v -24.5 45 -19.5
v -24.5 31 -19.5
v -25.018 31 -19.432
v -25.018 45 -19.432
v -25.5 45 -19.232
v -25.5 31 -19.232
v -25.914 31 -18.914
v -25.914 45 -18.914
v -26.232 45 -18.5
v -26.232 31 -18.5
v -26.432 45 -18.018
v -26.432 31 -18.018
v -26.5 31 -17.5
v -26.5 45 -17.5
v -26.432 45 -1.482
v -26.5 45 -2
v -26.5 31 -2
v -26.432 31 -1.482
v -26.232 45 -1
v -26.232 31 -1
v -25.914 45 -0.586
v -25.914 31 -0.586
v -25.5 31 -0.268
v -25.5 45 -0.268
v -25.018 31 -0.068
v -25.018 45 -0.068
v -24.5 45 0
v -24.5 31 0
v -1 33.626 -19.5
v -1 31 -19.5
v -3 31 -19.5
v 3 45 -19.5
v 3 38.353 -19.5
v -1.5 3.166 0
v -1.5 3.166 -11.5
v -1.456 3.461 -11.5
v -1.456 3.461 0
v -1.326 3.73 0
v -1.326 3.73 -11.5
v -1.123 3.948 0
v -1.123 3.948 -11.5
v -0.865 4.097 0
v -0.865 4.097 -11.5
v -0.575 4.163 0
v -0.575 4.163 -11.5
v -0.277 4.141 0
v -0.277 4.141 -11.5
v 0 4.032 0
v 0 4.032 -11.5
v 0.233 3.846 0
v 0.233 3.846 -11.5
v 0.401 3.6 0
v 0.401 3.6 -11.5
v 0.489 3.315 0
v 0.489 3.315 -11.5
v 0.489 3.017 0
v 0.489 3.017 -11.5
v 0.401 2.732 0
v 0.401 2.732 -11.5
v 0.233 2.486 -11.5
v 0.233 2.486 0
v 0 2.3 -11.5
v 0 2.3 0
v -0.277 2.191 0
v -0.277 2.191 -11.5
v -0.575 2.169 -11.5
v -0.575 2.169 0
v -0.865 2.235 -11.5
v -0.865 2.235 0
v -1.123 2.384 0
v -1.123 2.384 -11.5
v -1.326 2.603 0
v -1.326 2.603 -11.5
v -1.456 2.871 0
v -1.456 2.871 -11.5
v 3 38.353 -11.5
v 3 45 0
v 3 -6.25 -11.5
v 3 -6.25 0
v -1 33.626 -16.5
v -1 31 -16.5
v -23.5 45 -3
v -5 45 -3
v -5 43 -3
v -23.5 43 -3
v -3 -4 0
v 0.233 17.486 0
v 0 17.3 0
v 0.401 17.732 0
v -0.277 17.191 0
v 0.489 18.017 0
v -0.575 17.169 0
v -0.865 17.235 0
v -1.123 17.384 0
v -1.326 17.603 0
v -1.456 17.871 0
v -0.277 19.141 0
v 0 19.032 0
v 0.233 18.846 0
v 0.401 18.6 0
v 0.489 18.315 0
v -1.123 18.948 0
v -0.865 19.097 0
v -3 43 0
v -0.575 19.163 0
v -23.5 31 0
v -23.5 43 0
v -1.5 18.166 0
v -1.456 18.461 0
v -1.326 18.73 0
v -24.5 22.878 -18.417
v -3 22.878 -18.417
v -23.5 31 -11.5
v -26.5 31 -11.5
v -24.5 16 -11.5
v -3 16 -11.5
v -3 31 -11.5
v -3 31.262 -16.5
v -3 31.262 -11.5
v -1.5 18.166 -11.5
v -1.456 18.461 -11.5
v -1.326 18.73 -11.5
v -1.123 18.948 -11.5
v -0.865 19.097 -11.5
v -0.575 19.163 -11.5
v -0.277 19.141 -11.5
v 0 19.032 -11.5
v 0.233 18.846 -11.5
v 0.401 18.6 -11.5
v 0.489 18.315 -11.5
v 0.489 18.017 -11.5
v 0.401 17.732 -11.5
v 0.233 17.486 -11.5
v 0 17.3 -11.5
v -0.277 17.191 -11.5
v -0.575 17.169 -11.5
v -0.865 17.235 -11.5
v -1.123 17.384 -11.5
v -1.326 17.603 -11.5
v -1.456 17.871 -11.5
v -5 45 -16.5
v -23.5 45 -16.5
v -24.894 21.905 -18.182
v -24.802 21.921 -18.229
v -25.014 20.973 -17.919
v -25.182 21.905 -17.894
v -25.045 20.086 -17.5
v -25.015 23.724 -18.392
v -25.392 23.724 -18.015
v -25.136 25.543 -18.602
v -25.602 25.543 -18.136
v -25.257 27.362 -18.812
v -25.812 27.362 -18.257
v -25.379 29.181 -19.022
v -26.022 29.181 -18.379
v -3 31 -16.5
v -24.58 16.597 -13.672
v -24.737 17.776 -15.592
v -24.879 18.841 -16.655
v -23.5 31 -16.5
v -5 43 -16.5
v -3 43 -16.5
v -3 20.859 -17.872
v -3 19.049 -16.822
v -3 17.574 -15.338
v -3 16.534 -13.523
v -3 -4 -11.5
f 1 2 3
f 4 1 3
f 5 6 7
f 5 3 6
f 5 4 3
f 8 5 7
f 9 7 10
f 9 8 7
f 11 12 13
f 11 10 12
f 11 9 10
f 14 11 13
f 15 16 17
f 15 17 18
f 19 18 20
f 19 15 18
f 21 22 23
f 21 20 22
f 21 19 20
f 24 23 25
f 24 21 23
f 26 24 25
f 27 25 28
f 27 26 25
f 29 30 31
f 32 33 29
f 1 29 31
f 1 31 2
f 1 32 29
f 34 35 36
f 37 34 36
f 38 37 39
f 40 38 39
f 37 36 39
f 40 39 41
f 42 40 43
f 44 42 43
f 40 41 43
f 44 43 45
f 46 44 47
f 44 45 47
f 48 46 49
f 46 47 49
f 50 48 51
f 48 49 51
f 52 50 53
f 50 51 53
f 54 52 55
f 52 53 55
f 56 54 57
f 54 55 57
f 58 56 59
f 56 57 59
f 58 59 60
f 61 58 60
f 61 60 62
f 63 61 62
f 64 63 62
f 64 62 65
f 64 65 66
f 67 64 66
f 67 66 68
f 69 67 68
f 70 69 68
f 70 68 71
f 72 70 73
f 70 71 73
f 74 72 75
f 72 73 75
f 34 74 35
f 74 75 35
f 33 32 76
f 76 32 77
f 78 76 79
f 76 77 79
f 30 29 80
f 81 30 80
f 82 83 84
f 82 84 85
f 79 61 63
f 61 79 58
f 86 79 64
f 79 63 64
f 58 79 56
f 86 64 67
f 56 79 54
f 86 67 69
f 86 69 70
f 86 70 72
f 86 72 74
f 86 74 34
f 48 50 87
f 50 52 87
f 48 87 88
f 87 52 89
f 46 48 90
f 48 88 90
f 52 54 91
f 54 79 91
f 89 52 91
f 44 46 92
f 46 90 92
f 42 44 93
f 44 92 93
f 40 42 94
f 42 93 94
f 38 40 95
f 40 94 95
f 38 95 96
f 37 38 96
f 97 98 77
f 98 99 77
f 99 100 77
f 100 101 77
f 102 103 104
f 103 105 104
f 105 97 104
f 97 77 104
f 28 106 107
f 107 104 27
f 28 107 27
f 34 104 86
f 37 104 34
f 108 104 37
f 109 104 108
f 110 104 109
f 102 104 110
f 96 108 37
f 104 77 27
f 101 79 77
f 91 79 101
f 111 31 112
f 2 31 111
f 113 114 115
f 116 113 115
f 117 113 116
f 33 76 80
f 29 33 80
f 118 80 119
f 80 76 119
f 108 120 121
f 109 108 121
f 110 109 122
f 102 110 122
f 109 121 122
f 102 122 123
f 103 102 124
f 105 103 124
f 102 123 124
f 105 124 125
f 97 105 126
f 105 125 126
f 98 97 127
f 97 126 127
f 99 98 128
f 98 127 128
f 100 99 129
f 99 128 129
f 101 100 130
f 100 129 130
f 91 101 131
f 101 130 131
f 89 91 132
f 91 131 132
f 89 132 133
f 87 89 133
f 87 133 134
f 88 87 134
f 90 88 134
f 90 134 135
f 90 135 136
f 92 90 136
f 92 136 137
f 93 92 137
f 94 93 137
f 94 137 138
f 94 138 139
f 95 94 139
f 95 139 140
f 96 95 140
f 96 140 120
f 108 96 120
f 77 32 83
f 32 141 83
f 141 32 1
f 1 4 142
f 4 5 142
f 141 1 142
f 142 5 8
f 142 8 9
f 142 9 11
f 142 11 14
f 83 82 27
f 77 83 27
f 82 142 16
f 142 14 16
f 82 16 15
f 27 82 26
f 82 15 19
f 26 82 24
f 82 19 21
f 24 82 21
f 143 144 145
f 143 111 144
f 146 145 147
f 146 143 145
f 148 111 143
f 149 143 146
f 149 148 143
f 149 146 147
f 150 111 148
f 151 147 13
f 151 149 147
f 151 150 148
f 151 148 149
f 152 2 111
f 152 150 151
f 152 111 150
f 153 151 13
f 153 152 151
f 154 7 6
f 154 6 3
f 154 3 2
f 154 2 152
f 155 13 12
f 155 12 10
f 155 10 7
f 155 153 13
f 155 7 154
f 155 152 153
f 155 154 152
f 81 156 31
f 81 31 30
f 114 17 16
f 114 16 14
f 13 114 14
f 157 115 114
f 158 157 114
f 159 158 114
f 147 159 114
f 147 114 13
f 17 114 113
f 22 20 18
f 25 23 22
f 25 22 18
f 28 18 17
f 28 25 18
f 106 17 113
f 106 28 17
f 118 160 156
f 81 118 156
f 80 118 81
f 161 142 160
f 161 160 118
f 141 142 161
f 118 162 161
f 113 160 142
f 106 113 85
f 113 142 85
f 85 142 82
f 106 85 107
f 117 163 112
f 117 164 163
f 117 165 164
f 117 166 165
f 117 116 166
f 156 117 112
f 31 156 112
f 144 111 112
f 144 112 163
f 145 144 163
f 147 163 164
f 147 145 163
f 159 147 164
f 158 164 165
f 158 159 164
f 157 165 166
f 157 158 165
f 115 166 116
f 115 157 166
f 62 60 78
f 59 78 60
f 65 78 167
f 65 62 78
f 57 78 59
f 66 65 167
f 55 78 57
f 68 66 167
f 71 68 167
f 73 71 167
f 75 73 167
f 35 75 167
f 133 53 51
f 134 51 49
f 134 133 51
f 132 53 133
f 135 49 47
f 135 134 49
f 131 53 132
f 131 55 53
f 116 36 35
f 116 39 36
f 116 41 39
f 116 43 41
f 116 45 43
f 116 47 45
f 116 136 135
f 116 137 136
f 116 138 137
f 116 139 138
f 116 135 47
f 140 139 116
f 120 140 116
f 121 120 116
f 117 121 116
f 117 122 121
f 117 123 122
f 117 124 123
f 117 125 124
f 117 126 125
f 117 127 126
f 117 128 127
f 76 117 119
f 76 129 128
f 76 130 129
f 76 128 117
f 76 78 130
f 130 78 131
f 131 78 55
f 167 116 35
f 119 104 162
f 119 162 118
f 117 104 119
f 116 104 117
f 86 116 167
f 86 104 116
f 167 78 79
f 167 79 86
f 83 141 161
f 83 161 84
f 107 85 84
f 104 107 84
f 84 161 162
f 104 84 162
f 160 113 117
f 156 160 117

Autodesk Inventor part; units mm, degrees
ref_plane "YZ Plane" through (0, 0, 0) normal (1, 0, 0) x (0, 1, 0)
sketch "スケッチ1" plane through (0, 0, 0) normal (1, 0, 0) x (0, 1, 0)
  line L0 (45, 0) -> (0, 0)
  line L1 (0, 0) -> (0, -11.5)
  line L2 (0, -11.5) -> (45, -11.5)
  line L3 (45, -11.5) -> (45, 0)
  dimension "d0" = 45
  dimension "d1" = 11.5
extrude "押し出し1" add sketch "スケッチ1" along normal blind 3
sketch "スケッチ5" plane through (0, 45, 0) normal (0, 1, 0) x (1, 0, 0)
  line L0 (-5, 3) -> (-23.5, 3)
  line L1 (-23.5, 3) -> (-23.5, 16.5)
  line L2 (-23.5, 16.5) -> (-5, 16.5)
  line L3 (-5, 16.5) -> (-5, 3)
  line L4 (0, 0) -> (-26.5, 0)
  line L5 (-26.5, 0) -> (-26.5, 19.5)
  line L6 (-26.5, 19.5) -> (0, 19.5)
  line L7 (0, 19.5) -> (0, 0)
  point P0 (3, 0)
  dimension "d15" = 18.5
  dimension "d16" = 13.5
  dimension "d17" = 3
  dimension "d18" = 5
  dimension "d19" = 3
  dimension "d20" = 3
extrude "押し出し4" add sketch "スケッチ5" against normal blind 2
ref_plane "作業平面1" through (0, 45, -9.5) normal (1, 0, 0) x (0, 0, -1)
sketch "スケッチ7" plane through (0, 45, -9.5) normal (1, 0, 0) x (0, 0, -1)
  line L0 (0, 0) -> (10, 0) projected
  line L1 (10, -2) -> (2, -2) projected
  line L2 (10, 0) -> (10, -2) projected
  line L3 (2, 0) -> (10, 0) projected
  line L4 (2, -2) -> (2, 0) projected
  point P0 (-9.5, -45)
extrude "押し出し6" cut sketch "スケッチ7" against normal blind 1
fillet "フィレット2" radius 2 2 edges at (-26.5, 44, 0) (-26.5, 44, -19.5)
sketch "スケッチ8" plane through (0, 0, 0) normal (-1, 0, 0) x (0, 0, 1)
  line L0 (0, 43) -> (-11.5, 43) projected
  line L1 (-11.5, 0) -> (-11.5, 43) projected
  line L2 (0, 0) -> (-11.5, 0) projected
  line L3 (0, 43) -> (0, 0) projected
  line L4 (-3, 39.3409) -> (0, 39.3409)
  line L5 (0, 39.3409) -> (0, 27.7002)
  line L6 (0, 27.7002) -> (-3, 27.7002)
  line L7 (-3, 27.7002) -> (-3, 39.3409)
extrude "押し出し7" add sketch "スケッチ8" along normal blind 3
ref_plane "作業平面2" through (3, 2, -11.5) normal (0, 0, -1) x (-1, 0, 0)
sketch "スケッチ10" plane through (3, 2, -11.5) normal (0, 0, -1) x (-1, 0, 0)
  line L0 (-2, -9) -> (6, -6) projected
  line L1 (6, -6) -> (6, 22) projected
  line L2 (0, -2) -> (0, 0) projected
  line L3 (0, -2) -> (6, -2) projected
  line L4 (0, -2) -> (0, -8.25)
  point P0 (3, -2)
extrude "押し出し9" add sketch "スケッチ10" against normal up to surface (11.5 mm away)
sketch "スケッチ11" plane through (3, 45, -11.5) normal (0, 0, -1) x (-1, 0, 0)
  circle A0 centre (3.5, -26.8338) radius 1 projected
  circle A1 centre (3.5, -41.8338) radius 1 projected
  point P0 (3, -45)
sketch "スケッチ12" plane through (0, 43, 0) normal (0, -1, 0) x (1, 0, 0)
  line L0 (-1, -11.5) -> (-3, -11.5) projected
  line L1 (-3, -11.5) -> (-3, 0) projected
  line L2 (-3, 0) -> (-24.5, 0) projected
  arc A0 (-24.5, 0) -> (-26.5, -2) centre (-24.5, -2) ccw projected
  line L3 (-26.5, -2) -> (-26.5, -17.5) projected
  arc A1 (-26.5, -17.5) -> (-24.5, -19.5) centre (-24.5, -17.5) ccw projected
  line L4 (-24.5, -19.5) -> (-1, -19.5) projected
  line L5 (-1, -19.5) -> (-1, -11.5) projected
  line L6 (-23.5, -3) -> (-5, -3) projected
  line L7 (-5, -3) -> (-5, -16.5) projected
  line L8 (-5, -16.5) -> (-23.5, -16.5) projected
  line L9 (-23.5, -16.5) -> (-23.5, -3) projected
  line L10 (-5, -16.5) -> (-1, -16.5)
  line L11 (-23.5, -3) -> (-23.5, 0)
  line L12 (-3, -11.5) -> (-5, -16.5)
  point P0 (0, 0)
extrude "押し出し10" add sketch "スケッチ12" along normal blind 12 contours L5 L4 A1 L3 A0 L2 L11 L9 L8 L10
sketch "スケッチ13" plane through (3, 45, -11.5) normal (0, 0, -1) x (-1, 0, 0)
  line L0 (6, -16.8338) -> (-2.2366, -7.0996) projected
  line L1 (6, -2) -> (6, -49) projected
  line L2 (4, -2) -> (6, -2) projected
  line L3 (4, -2) -> (4, 0) projected
  line L4 (4, 0) -> (0, 0) projected
  line L5 (0, 0) -> (0, -51.25) projected
  line L6 (0, -51.25) -> (6, -49) projected
  line L7 (0, -6.6466) -> (6, -13.7375)
  line L8 (6, -49) -> (6, -2) projected
  point P0 (3, -45)
  point P1 (6, -13.7375)
  dimension "d38" = 2
extrude "押し出し11" add sketch "スケッチ13" along normal up to surface (8 mm away) contours L7 L5 L4 L3 L2 L1
sketch "スケッチ14" plane through (0, 31, 0) normal (0, -1, 0) x (1, 0, 0)
  line L0 (-1, -19.5) -> (-1, -16.5) projected
  line L1 (-1, -16.5) -> (-23.5, -16.5) projected
  line L2 (-23.5, -16.5) -> (-23.5, 0) projected
  line L3 (-23.5, 0) -> (-24.5, 0) projected
  arc A0 (-24.5, 0) -> (-26.5, -2) centre (-24.5, -2) ccw projected
  line L4 (-26.5, -2) -> (-26.5, -17.5) projected
  arc A1 (-26.5, -17.5) -> (-24.5, -19.5) centre (-24.5, -17.5) ccw projected
  line L5 (-24.5, -19.5) -> (-1, -19.5) projected
  line L6 (-1, -19.5) -> (-26.5, -19.5)
  line L7 (-26.5, -19.5) -> (-26.5, -11.5)
  line L8 (-26.5, -11.5) -> (-1, -11.5)
  line L9 (-1, -11.5) -> (-1, -19.5)
  line L10 (-3, -11.5) -> (-3, -16.5) projected
  line L11 (-3, -16.5) -> (-3, -19.5)
  point P0 (0, 0)
  dimension "d41" = 8
extrude "押し出し12" add sketch "スケッチ14" along normal blind 15 contours L5 A1 L4 L8 L2 L1 L11 | L1 L2 L8 L10
chamfer "面取り1" distance 2 distance2 15 3 edges at (-13.75, 16, -19.5) (-25.9142, 16, -18.9142) (-26.5, 16, -14.5) measured on face at (-18, 16, -14.1667)
fillet "フィレット3" radius 8 1 edges at (-13.75, 16, -17.5001)
extrude "押し出し13" cut sketch "スケッチ11" against normal through all
equation "\"d19\" = d17"
equation "\"d20\" = d17"
properties part number "switch_setter"
